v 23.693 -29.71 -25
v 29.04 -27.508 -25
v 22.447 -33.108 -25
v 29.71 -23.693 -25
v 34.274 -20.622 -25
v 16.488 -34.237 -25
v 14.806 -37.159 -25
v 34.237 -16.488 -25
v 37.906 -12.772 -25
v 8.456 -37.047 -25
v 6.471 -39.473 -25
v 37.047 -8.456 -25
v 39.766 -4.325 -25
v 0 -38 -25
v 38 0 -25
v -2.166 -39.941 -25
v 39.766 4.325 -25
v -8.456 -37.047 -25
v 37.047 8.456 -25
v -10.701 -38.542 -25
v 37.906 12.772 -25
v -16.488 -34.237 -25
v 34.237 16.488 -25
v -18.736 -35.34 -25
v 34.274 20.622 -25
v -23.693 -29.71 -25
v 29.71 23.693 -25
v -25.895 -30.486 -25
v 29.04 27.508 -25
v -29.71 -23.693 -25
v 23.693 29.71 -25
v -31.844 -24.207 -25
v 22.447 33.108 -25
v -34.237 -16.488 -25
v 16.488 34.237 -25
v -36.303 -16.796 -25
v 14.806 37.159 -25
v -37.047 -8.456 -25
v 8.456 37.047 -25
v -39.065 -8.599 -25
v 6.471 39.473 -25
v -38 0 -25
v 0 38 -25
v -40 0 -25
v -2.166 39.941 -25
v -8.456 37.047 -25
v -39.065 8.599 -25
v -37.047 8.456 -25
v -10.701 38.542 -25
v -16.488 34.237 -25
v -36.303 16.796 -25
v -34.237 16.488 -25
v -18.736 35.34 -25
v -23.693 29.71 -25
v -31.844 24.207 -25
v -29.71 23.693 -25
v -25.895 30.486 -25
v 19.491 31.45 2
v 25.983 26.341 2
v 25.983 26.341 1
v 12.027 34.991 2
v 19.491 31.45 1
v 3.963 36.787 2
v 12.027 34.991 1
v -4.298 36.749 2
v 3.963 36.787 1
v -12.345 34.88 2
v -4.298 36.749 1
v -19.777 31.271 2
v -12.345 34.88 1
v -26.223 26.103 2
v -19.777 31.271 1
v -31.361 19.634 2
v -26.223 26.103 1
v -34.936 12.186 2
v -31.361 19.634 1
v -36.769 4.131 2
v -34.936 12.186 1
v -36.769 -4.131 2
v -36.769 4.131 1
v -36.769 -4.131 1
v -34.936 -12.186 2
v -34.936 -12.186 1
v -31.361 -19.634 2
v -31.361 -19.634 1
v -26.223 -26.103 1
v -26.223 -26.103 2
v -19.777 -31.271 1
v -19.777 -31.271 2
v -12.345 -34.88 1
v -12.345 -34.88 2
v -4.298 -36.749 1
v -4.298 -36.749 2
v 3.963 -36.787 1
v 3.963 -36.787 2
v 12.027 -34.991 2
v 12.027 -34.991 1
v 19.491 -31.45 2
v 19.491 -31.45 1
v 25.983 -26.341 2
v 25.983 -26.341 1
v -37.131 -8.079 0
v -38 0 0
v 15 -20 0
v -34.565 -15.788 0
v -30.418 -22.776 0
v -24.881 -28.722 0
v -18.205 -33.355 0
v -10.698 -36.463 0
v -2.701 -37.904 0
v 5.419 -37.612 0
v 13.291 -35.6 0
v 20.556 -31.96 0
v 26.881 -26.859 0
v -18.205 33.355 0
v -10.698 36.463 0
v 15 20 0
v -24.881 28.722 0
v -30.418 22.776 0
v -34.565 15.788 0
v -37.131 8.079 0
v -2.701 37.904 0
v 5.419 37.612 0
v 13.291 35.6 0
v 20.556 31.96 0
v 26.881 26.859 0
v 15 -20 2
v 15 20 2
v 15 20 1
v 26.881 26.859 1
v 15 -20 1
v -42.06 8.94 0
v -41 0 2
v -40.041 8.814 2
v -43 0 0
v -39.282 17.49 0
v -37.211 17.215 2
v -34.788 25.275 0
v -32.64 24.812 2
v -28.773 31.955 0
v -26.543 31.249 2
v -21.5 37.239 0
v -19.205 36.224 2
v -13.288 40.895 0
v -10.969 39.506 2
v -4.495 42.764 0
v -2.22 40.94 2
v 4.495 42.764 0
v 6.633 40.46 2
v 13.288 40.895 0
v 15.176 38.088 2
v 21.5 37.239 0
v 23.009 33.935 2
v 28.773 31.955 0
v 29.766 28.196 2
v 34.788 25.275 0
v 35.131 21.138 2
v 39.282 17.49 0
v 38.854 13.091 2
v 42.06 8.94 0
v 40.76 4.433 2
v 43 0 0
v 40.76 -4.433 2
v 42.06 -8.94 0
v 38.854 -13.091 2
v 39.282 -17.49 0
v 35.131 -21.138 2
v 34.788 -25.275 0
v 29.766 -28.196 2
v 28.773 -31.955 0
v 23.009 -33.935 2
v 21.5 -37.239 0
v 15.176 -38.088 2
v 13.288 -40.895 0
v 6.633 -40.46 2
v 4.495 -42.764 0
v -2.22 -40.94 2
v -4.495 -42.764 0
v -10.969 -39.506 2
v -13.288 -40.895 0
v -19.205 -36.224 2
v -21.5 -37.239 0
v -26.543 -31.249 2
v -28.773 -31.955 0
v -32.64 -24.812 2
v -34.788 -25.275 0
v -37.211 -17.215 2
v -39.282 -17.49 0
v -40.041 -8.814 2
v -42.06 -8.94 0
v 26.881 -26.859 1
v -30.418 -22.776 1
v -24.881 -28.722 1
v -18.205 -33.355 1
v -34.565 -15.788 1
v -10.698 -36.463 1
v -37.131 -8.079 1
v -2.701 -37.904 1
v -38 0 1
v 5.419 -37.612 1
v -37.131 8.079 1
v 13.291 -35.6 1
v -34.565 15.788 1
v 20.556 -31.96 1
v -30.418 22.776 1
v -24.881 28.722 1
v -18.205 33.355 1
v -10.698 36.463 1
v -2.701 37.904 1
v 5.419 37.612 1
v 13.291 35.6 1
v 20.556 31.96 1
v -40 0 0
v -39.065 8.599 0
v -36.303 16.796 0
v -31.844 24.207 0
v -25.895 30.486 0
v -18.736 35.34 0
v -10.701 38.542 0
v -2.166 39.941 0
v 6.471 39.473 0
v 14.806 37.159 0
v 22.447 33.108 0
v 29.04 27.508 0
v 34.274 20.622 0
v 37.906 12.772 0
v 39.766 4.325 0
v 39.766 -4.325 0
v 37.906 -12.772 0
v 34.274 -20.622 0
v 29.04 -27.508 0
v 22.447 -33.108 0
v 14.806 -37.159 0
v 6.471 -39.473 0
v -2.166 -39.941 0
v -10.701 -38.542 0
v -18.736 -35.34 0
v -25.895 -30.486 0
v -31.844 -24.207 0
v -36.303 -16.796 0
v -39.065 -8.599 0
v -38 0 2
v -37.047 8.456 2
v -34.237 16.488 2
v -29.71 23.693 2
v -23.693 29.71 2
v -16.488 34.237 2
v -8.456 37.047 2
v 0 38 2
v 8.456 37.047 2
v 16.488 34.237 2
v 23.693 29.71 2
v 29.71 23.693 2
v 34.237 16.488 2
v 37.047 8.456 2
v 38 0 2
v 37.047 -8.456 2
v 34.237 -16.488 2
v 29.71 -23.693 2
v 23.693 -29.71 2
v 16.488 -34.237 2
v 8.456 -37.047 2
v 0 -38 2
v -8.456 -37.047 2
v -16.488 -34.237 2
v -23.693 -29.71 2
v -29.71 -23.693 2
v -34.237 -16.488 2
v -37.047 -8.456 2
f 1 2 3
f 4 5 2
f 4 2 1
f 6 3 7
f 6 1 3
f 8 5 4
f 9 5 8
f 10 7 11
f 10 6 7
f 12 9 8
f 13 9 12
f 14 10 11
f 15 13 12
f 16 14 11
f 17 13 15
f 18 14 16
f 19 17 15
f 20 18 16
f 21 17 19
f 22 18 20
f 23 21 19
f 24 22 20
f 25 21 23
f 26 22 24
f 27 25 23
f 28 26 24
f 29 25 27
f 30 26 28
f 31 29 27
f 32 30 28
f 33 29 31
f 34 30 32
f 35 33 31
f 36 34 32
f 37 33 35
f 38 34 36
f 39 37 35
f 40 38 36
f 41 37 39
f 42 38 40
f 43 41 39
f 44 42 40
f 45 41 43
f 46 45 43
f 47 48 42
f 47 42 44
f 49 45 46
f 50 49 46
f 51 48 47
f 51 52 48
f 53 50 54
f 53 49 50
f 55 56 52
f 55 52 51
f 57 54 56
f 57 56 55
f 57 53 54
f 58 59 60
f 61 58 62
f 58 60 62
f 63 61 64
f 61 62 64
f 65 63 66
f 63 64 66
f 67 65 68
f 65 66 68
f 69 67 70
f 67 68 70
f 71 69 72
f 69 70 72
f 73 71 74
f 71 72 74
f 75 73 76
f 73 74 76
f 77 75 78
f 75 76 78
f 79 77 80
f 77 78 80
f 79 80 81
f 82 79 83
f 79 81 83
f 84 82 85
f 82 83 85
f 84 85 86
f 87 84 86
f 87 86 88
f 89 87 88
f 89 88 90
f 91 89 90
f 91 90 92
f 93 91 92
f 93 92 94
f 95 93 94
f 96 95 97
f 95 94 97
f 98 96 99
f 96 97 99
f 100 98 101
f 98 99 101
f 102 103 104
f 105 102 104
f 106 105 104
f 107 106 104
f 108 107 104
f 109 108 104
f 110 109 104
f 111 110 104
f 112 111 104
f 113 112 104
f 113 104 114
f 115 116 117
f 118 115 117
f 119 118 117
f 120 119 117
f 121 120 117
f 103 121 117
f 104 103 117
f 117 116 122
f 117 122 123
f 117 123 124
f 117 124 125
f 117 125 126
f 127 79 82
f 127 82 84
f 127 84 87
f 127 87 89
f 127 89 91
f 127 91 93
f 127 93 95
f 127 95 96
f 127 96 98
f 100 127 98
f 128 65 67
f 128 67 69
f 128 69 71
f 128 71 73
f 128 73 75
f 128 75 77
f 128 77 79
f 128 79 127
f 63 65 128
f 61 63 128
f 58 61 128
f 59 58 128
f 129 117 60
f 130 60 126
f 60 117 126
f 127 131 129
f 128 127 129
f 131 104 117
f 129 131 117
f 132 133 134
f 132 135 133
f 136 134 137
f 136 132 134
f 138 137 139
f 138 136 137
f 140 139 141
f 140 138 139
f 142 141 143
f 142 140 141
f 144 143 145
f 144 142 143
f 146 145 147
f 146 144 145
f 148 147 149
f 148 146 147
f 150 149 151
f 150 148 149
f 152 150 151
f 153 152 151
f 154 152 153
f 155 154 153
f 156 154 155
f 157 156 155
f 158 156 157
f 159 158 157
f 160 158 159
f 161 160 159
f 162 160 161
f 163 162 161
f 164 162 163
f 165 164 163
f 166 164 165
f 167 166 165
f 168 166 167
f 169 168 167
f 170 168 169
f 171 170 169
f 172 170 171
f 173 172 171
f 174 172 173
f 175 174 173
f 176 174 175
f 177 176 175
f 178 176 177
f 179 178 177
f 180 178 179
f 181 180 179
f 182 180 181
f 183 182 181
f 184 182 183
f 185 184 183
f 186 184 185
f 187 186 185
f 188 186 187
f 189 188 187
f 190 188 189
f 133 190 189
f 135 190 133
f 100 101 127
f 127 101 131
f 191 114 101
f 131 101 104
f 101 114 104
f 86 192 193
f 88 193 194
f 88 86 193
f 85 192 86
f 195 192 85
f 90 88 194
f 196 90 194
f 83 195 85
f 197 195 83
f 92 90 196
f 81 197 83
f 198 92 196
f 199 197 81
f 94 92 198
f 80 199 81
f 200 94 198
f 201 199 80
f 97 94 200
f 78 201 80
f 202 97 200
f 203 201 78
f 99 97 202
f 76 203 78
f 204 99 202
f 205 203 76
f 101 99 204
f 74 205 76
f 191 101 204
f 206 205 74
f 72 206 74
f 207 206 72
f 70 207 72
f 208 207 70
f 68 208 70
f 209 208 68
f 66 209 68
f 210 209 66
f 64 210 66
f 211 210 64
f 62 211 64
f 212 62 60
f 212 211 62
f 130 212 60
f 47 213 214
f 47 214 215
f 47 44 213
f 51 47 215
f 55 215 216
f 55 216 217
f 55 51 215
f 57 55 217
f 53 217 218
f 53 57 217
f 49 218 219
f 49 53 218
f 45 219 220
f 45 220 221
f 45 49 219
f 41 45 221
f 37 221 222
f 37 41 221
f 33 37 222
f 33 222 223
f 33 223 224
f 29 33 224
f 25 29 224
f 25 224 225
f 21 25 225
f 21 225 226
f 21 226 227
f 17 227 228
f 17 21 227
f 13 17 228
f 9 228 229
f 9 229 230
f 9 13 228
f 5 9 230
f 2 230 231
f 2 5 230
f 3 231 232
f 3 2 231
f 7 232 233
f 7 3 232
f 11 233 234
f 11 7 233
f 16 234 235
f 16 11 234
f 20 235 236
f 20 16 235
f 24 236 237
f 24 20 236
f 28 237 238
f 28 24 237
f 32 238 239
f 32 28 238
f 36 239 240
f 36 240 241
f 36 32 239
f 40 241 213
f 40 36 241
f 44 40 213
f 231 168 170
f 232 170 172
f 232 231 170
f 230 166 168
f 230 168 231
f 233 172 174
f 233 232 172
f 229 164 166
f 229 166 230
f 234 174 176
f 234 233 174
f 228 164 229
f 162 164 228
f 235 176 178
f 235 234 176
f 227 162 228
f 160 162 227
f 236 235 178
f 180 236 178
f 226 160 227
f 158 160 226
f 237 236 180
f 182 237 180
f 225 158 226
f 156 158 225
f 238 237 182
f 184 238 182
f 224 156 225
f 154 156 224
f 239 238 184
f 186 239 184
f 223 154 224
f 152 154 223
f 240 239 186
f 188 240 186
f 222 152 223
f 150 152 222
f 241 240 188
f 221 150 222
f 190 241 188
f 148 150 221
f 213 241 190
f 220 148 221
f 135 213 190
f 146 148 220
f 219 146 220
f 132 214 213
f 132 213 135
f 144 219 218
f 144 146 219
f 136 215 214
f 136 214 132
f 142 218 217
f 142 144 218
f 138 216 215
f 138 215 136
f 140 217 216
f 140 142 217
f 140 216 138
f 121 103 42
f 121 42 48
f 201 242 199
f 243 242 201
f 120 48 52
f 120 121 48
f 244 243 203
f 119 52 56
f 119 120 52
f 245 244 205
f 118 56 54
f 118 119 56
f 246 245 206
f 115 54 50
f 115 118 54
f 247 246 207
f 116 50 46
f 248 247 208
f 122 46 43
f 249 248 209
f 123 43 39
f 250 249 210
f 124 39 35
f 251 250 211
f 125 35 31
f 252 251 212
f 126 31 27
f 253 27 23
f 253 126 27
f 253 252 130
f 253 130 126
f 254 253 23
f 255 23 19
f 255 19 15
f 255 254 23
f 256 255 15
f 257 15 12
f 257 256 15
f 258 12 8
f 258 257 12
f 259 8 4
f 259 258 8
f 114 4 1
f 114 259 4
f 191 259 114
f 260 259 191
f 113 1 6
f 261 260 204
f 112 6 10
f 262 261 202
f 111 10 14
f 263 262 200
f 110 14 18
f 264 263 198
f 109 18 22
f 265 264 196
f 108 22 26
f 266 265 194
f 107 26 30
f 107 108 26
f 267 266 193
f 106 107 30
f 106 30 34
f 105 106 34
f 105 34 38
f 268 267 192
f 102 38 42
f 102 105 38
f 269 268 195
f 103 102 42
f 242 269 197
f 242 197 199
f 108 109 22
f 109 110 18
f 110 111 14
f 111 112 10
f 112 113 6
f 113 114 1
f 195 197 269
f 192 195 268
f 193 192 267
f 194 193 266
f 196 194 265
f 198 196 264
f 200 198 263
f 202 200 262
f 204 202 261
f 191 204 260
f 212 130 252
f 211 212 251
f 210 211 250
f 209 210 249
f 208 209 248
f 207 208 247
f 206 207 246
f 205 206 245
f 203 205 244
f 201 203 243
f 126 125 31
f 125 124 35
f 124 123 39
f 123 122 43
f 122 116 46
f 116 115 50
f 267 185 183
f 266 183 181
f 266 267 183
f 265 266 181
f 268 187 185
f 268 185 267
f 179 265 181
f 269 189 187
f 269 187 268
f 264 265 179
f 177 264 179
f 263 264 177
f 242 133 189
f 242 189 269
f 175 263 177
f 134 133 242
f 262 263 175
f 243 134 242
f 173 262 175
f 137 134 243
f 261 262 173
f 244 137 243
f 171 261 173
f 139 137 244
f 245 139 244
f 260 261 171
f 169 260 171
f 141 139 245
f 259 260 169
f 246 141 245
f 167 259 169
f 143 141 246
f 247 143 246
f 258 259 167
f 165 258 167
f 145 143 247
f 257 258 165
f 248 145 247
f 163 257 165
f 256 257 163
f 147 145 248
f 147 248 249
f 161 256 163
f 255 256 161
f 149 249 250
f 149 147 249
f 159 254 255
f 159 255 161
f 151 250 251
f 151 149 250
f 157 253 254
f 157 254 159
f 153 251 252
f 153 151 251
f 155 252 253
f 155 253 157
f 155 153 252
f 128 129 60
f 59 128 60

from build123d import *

# Parameters (mm, degrees)
F3_DEPTH = 1
F5_DEPTH = 1


with BuildPart() as f1:
    # F0 (on Front) → F1 (revolve)
    with BuildSketch(Plane.XZ):
        Polygon((-38, -25), (-38, 2), (-41, 2), (-43, 0), (-40, 0), (-40, -25), align=None)
    revolve(axis=Axis((0, 0, -43.882875), (0, 0, -1)))

    # F2 (on Top) → F3 (join)
    with BuildSketch(Plane.XY):
        with BuildLine():
            Line((15, 20), (26.880754, 26.859357))
            ThreePointArc((26.880754, 26.859357), (-38, 0), (26.880754, -26.859357))
            Line((26.880754, -26.859357), (15, -20))
            Line((15, -20), (15, 20))
        make_face()
    extrude(amount=F3_DEPTH)

    # F4 (on face) → F5 (join, through all)
    with BuildSketch(Plane.XY.offset(1)):
        with BuildLine():
            Line((15, 20), (25.983406, 26.341272))
            ThreePointArc((25.983406, 26.341272), (-37, 0), (25.983406, -26.341272))
            Line((25.983406, -26.341272), (15, -20))
            Line((15, -20), (15, 20))
        make_face()
    extrude(amount=F5_DEPTH)


solid = f1.part
